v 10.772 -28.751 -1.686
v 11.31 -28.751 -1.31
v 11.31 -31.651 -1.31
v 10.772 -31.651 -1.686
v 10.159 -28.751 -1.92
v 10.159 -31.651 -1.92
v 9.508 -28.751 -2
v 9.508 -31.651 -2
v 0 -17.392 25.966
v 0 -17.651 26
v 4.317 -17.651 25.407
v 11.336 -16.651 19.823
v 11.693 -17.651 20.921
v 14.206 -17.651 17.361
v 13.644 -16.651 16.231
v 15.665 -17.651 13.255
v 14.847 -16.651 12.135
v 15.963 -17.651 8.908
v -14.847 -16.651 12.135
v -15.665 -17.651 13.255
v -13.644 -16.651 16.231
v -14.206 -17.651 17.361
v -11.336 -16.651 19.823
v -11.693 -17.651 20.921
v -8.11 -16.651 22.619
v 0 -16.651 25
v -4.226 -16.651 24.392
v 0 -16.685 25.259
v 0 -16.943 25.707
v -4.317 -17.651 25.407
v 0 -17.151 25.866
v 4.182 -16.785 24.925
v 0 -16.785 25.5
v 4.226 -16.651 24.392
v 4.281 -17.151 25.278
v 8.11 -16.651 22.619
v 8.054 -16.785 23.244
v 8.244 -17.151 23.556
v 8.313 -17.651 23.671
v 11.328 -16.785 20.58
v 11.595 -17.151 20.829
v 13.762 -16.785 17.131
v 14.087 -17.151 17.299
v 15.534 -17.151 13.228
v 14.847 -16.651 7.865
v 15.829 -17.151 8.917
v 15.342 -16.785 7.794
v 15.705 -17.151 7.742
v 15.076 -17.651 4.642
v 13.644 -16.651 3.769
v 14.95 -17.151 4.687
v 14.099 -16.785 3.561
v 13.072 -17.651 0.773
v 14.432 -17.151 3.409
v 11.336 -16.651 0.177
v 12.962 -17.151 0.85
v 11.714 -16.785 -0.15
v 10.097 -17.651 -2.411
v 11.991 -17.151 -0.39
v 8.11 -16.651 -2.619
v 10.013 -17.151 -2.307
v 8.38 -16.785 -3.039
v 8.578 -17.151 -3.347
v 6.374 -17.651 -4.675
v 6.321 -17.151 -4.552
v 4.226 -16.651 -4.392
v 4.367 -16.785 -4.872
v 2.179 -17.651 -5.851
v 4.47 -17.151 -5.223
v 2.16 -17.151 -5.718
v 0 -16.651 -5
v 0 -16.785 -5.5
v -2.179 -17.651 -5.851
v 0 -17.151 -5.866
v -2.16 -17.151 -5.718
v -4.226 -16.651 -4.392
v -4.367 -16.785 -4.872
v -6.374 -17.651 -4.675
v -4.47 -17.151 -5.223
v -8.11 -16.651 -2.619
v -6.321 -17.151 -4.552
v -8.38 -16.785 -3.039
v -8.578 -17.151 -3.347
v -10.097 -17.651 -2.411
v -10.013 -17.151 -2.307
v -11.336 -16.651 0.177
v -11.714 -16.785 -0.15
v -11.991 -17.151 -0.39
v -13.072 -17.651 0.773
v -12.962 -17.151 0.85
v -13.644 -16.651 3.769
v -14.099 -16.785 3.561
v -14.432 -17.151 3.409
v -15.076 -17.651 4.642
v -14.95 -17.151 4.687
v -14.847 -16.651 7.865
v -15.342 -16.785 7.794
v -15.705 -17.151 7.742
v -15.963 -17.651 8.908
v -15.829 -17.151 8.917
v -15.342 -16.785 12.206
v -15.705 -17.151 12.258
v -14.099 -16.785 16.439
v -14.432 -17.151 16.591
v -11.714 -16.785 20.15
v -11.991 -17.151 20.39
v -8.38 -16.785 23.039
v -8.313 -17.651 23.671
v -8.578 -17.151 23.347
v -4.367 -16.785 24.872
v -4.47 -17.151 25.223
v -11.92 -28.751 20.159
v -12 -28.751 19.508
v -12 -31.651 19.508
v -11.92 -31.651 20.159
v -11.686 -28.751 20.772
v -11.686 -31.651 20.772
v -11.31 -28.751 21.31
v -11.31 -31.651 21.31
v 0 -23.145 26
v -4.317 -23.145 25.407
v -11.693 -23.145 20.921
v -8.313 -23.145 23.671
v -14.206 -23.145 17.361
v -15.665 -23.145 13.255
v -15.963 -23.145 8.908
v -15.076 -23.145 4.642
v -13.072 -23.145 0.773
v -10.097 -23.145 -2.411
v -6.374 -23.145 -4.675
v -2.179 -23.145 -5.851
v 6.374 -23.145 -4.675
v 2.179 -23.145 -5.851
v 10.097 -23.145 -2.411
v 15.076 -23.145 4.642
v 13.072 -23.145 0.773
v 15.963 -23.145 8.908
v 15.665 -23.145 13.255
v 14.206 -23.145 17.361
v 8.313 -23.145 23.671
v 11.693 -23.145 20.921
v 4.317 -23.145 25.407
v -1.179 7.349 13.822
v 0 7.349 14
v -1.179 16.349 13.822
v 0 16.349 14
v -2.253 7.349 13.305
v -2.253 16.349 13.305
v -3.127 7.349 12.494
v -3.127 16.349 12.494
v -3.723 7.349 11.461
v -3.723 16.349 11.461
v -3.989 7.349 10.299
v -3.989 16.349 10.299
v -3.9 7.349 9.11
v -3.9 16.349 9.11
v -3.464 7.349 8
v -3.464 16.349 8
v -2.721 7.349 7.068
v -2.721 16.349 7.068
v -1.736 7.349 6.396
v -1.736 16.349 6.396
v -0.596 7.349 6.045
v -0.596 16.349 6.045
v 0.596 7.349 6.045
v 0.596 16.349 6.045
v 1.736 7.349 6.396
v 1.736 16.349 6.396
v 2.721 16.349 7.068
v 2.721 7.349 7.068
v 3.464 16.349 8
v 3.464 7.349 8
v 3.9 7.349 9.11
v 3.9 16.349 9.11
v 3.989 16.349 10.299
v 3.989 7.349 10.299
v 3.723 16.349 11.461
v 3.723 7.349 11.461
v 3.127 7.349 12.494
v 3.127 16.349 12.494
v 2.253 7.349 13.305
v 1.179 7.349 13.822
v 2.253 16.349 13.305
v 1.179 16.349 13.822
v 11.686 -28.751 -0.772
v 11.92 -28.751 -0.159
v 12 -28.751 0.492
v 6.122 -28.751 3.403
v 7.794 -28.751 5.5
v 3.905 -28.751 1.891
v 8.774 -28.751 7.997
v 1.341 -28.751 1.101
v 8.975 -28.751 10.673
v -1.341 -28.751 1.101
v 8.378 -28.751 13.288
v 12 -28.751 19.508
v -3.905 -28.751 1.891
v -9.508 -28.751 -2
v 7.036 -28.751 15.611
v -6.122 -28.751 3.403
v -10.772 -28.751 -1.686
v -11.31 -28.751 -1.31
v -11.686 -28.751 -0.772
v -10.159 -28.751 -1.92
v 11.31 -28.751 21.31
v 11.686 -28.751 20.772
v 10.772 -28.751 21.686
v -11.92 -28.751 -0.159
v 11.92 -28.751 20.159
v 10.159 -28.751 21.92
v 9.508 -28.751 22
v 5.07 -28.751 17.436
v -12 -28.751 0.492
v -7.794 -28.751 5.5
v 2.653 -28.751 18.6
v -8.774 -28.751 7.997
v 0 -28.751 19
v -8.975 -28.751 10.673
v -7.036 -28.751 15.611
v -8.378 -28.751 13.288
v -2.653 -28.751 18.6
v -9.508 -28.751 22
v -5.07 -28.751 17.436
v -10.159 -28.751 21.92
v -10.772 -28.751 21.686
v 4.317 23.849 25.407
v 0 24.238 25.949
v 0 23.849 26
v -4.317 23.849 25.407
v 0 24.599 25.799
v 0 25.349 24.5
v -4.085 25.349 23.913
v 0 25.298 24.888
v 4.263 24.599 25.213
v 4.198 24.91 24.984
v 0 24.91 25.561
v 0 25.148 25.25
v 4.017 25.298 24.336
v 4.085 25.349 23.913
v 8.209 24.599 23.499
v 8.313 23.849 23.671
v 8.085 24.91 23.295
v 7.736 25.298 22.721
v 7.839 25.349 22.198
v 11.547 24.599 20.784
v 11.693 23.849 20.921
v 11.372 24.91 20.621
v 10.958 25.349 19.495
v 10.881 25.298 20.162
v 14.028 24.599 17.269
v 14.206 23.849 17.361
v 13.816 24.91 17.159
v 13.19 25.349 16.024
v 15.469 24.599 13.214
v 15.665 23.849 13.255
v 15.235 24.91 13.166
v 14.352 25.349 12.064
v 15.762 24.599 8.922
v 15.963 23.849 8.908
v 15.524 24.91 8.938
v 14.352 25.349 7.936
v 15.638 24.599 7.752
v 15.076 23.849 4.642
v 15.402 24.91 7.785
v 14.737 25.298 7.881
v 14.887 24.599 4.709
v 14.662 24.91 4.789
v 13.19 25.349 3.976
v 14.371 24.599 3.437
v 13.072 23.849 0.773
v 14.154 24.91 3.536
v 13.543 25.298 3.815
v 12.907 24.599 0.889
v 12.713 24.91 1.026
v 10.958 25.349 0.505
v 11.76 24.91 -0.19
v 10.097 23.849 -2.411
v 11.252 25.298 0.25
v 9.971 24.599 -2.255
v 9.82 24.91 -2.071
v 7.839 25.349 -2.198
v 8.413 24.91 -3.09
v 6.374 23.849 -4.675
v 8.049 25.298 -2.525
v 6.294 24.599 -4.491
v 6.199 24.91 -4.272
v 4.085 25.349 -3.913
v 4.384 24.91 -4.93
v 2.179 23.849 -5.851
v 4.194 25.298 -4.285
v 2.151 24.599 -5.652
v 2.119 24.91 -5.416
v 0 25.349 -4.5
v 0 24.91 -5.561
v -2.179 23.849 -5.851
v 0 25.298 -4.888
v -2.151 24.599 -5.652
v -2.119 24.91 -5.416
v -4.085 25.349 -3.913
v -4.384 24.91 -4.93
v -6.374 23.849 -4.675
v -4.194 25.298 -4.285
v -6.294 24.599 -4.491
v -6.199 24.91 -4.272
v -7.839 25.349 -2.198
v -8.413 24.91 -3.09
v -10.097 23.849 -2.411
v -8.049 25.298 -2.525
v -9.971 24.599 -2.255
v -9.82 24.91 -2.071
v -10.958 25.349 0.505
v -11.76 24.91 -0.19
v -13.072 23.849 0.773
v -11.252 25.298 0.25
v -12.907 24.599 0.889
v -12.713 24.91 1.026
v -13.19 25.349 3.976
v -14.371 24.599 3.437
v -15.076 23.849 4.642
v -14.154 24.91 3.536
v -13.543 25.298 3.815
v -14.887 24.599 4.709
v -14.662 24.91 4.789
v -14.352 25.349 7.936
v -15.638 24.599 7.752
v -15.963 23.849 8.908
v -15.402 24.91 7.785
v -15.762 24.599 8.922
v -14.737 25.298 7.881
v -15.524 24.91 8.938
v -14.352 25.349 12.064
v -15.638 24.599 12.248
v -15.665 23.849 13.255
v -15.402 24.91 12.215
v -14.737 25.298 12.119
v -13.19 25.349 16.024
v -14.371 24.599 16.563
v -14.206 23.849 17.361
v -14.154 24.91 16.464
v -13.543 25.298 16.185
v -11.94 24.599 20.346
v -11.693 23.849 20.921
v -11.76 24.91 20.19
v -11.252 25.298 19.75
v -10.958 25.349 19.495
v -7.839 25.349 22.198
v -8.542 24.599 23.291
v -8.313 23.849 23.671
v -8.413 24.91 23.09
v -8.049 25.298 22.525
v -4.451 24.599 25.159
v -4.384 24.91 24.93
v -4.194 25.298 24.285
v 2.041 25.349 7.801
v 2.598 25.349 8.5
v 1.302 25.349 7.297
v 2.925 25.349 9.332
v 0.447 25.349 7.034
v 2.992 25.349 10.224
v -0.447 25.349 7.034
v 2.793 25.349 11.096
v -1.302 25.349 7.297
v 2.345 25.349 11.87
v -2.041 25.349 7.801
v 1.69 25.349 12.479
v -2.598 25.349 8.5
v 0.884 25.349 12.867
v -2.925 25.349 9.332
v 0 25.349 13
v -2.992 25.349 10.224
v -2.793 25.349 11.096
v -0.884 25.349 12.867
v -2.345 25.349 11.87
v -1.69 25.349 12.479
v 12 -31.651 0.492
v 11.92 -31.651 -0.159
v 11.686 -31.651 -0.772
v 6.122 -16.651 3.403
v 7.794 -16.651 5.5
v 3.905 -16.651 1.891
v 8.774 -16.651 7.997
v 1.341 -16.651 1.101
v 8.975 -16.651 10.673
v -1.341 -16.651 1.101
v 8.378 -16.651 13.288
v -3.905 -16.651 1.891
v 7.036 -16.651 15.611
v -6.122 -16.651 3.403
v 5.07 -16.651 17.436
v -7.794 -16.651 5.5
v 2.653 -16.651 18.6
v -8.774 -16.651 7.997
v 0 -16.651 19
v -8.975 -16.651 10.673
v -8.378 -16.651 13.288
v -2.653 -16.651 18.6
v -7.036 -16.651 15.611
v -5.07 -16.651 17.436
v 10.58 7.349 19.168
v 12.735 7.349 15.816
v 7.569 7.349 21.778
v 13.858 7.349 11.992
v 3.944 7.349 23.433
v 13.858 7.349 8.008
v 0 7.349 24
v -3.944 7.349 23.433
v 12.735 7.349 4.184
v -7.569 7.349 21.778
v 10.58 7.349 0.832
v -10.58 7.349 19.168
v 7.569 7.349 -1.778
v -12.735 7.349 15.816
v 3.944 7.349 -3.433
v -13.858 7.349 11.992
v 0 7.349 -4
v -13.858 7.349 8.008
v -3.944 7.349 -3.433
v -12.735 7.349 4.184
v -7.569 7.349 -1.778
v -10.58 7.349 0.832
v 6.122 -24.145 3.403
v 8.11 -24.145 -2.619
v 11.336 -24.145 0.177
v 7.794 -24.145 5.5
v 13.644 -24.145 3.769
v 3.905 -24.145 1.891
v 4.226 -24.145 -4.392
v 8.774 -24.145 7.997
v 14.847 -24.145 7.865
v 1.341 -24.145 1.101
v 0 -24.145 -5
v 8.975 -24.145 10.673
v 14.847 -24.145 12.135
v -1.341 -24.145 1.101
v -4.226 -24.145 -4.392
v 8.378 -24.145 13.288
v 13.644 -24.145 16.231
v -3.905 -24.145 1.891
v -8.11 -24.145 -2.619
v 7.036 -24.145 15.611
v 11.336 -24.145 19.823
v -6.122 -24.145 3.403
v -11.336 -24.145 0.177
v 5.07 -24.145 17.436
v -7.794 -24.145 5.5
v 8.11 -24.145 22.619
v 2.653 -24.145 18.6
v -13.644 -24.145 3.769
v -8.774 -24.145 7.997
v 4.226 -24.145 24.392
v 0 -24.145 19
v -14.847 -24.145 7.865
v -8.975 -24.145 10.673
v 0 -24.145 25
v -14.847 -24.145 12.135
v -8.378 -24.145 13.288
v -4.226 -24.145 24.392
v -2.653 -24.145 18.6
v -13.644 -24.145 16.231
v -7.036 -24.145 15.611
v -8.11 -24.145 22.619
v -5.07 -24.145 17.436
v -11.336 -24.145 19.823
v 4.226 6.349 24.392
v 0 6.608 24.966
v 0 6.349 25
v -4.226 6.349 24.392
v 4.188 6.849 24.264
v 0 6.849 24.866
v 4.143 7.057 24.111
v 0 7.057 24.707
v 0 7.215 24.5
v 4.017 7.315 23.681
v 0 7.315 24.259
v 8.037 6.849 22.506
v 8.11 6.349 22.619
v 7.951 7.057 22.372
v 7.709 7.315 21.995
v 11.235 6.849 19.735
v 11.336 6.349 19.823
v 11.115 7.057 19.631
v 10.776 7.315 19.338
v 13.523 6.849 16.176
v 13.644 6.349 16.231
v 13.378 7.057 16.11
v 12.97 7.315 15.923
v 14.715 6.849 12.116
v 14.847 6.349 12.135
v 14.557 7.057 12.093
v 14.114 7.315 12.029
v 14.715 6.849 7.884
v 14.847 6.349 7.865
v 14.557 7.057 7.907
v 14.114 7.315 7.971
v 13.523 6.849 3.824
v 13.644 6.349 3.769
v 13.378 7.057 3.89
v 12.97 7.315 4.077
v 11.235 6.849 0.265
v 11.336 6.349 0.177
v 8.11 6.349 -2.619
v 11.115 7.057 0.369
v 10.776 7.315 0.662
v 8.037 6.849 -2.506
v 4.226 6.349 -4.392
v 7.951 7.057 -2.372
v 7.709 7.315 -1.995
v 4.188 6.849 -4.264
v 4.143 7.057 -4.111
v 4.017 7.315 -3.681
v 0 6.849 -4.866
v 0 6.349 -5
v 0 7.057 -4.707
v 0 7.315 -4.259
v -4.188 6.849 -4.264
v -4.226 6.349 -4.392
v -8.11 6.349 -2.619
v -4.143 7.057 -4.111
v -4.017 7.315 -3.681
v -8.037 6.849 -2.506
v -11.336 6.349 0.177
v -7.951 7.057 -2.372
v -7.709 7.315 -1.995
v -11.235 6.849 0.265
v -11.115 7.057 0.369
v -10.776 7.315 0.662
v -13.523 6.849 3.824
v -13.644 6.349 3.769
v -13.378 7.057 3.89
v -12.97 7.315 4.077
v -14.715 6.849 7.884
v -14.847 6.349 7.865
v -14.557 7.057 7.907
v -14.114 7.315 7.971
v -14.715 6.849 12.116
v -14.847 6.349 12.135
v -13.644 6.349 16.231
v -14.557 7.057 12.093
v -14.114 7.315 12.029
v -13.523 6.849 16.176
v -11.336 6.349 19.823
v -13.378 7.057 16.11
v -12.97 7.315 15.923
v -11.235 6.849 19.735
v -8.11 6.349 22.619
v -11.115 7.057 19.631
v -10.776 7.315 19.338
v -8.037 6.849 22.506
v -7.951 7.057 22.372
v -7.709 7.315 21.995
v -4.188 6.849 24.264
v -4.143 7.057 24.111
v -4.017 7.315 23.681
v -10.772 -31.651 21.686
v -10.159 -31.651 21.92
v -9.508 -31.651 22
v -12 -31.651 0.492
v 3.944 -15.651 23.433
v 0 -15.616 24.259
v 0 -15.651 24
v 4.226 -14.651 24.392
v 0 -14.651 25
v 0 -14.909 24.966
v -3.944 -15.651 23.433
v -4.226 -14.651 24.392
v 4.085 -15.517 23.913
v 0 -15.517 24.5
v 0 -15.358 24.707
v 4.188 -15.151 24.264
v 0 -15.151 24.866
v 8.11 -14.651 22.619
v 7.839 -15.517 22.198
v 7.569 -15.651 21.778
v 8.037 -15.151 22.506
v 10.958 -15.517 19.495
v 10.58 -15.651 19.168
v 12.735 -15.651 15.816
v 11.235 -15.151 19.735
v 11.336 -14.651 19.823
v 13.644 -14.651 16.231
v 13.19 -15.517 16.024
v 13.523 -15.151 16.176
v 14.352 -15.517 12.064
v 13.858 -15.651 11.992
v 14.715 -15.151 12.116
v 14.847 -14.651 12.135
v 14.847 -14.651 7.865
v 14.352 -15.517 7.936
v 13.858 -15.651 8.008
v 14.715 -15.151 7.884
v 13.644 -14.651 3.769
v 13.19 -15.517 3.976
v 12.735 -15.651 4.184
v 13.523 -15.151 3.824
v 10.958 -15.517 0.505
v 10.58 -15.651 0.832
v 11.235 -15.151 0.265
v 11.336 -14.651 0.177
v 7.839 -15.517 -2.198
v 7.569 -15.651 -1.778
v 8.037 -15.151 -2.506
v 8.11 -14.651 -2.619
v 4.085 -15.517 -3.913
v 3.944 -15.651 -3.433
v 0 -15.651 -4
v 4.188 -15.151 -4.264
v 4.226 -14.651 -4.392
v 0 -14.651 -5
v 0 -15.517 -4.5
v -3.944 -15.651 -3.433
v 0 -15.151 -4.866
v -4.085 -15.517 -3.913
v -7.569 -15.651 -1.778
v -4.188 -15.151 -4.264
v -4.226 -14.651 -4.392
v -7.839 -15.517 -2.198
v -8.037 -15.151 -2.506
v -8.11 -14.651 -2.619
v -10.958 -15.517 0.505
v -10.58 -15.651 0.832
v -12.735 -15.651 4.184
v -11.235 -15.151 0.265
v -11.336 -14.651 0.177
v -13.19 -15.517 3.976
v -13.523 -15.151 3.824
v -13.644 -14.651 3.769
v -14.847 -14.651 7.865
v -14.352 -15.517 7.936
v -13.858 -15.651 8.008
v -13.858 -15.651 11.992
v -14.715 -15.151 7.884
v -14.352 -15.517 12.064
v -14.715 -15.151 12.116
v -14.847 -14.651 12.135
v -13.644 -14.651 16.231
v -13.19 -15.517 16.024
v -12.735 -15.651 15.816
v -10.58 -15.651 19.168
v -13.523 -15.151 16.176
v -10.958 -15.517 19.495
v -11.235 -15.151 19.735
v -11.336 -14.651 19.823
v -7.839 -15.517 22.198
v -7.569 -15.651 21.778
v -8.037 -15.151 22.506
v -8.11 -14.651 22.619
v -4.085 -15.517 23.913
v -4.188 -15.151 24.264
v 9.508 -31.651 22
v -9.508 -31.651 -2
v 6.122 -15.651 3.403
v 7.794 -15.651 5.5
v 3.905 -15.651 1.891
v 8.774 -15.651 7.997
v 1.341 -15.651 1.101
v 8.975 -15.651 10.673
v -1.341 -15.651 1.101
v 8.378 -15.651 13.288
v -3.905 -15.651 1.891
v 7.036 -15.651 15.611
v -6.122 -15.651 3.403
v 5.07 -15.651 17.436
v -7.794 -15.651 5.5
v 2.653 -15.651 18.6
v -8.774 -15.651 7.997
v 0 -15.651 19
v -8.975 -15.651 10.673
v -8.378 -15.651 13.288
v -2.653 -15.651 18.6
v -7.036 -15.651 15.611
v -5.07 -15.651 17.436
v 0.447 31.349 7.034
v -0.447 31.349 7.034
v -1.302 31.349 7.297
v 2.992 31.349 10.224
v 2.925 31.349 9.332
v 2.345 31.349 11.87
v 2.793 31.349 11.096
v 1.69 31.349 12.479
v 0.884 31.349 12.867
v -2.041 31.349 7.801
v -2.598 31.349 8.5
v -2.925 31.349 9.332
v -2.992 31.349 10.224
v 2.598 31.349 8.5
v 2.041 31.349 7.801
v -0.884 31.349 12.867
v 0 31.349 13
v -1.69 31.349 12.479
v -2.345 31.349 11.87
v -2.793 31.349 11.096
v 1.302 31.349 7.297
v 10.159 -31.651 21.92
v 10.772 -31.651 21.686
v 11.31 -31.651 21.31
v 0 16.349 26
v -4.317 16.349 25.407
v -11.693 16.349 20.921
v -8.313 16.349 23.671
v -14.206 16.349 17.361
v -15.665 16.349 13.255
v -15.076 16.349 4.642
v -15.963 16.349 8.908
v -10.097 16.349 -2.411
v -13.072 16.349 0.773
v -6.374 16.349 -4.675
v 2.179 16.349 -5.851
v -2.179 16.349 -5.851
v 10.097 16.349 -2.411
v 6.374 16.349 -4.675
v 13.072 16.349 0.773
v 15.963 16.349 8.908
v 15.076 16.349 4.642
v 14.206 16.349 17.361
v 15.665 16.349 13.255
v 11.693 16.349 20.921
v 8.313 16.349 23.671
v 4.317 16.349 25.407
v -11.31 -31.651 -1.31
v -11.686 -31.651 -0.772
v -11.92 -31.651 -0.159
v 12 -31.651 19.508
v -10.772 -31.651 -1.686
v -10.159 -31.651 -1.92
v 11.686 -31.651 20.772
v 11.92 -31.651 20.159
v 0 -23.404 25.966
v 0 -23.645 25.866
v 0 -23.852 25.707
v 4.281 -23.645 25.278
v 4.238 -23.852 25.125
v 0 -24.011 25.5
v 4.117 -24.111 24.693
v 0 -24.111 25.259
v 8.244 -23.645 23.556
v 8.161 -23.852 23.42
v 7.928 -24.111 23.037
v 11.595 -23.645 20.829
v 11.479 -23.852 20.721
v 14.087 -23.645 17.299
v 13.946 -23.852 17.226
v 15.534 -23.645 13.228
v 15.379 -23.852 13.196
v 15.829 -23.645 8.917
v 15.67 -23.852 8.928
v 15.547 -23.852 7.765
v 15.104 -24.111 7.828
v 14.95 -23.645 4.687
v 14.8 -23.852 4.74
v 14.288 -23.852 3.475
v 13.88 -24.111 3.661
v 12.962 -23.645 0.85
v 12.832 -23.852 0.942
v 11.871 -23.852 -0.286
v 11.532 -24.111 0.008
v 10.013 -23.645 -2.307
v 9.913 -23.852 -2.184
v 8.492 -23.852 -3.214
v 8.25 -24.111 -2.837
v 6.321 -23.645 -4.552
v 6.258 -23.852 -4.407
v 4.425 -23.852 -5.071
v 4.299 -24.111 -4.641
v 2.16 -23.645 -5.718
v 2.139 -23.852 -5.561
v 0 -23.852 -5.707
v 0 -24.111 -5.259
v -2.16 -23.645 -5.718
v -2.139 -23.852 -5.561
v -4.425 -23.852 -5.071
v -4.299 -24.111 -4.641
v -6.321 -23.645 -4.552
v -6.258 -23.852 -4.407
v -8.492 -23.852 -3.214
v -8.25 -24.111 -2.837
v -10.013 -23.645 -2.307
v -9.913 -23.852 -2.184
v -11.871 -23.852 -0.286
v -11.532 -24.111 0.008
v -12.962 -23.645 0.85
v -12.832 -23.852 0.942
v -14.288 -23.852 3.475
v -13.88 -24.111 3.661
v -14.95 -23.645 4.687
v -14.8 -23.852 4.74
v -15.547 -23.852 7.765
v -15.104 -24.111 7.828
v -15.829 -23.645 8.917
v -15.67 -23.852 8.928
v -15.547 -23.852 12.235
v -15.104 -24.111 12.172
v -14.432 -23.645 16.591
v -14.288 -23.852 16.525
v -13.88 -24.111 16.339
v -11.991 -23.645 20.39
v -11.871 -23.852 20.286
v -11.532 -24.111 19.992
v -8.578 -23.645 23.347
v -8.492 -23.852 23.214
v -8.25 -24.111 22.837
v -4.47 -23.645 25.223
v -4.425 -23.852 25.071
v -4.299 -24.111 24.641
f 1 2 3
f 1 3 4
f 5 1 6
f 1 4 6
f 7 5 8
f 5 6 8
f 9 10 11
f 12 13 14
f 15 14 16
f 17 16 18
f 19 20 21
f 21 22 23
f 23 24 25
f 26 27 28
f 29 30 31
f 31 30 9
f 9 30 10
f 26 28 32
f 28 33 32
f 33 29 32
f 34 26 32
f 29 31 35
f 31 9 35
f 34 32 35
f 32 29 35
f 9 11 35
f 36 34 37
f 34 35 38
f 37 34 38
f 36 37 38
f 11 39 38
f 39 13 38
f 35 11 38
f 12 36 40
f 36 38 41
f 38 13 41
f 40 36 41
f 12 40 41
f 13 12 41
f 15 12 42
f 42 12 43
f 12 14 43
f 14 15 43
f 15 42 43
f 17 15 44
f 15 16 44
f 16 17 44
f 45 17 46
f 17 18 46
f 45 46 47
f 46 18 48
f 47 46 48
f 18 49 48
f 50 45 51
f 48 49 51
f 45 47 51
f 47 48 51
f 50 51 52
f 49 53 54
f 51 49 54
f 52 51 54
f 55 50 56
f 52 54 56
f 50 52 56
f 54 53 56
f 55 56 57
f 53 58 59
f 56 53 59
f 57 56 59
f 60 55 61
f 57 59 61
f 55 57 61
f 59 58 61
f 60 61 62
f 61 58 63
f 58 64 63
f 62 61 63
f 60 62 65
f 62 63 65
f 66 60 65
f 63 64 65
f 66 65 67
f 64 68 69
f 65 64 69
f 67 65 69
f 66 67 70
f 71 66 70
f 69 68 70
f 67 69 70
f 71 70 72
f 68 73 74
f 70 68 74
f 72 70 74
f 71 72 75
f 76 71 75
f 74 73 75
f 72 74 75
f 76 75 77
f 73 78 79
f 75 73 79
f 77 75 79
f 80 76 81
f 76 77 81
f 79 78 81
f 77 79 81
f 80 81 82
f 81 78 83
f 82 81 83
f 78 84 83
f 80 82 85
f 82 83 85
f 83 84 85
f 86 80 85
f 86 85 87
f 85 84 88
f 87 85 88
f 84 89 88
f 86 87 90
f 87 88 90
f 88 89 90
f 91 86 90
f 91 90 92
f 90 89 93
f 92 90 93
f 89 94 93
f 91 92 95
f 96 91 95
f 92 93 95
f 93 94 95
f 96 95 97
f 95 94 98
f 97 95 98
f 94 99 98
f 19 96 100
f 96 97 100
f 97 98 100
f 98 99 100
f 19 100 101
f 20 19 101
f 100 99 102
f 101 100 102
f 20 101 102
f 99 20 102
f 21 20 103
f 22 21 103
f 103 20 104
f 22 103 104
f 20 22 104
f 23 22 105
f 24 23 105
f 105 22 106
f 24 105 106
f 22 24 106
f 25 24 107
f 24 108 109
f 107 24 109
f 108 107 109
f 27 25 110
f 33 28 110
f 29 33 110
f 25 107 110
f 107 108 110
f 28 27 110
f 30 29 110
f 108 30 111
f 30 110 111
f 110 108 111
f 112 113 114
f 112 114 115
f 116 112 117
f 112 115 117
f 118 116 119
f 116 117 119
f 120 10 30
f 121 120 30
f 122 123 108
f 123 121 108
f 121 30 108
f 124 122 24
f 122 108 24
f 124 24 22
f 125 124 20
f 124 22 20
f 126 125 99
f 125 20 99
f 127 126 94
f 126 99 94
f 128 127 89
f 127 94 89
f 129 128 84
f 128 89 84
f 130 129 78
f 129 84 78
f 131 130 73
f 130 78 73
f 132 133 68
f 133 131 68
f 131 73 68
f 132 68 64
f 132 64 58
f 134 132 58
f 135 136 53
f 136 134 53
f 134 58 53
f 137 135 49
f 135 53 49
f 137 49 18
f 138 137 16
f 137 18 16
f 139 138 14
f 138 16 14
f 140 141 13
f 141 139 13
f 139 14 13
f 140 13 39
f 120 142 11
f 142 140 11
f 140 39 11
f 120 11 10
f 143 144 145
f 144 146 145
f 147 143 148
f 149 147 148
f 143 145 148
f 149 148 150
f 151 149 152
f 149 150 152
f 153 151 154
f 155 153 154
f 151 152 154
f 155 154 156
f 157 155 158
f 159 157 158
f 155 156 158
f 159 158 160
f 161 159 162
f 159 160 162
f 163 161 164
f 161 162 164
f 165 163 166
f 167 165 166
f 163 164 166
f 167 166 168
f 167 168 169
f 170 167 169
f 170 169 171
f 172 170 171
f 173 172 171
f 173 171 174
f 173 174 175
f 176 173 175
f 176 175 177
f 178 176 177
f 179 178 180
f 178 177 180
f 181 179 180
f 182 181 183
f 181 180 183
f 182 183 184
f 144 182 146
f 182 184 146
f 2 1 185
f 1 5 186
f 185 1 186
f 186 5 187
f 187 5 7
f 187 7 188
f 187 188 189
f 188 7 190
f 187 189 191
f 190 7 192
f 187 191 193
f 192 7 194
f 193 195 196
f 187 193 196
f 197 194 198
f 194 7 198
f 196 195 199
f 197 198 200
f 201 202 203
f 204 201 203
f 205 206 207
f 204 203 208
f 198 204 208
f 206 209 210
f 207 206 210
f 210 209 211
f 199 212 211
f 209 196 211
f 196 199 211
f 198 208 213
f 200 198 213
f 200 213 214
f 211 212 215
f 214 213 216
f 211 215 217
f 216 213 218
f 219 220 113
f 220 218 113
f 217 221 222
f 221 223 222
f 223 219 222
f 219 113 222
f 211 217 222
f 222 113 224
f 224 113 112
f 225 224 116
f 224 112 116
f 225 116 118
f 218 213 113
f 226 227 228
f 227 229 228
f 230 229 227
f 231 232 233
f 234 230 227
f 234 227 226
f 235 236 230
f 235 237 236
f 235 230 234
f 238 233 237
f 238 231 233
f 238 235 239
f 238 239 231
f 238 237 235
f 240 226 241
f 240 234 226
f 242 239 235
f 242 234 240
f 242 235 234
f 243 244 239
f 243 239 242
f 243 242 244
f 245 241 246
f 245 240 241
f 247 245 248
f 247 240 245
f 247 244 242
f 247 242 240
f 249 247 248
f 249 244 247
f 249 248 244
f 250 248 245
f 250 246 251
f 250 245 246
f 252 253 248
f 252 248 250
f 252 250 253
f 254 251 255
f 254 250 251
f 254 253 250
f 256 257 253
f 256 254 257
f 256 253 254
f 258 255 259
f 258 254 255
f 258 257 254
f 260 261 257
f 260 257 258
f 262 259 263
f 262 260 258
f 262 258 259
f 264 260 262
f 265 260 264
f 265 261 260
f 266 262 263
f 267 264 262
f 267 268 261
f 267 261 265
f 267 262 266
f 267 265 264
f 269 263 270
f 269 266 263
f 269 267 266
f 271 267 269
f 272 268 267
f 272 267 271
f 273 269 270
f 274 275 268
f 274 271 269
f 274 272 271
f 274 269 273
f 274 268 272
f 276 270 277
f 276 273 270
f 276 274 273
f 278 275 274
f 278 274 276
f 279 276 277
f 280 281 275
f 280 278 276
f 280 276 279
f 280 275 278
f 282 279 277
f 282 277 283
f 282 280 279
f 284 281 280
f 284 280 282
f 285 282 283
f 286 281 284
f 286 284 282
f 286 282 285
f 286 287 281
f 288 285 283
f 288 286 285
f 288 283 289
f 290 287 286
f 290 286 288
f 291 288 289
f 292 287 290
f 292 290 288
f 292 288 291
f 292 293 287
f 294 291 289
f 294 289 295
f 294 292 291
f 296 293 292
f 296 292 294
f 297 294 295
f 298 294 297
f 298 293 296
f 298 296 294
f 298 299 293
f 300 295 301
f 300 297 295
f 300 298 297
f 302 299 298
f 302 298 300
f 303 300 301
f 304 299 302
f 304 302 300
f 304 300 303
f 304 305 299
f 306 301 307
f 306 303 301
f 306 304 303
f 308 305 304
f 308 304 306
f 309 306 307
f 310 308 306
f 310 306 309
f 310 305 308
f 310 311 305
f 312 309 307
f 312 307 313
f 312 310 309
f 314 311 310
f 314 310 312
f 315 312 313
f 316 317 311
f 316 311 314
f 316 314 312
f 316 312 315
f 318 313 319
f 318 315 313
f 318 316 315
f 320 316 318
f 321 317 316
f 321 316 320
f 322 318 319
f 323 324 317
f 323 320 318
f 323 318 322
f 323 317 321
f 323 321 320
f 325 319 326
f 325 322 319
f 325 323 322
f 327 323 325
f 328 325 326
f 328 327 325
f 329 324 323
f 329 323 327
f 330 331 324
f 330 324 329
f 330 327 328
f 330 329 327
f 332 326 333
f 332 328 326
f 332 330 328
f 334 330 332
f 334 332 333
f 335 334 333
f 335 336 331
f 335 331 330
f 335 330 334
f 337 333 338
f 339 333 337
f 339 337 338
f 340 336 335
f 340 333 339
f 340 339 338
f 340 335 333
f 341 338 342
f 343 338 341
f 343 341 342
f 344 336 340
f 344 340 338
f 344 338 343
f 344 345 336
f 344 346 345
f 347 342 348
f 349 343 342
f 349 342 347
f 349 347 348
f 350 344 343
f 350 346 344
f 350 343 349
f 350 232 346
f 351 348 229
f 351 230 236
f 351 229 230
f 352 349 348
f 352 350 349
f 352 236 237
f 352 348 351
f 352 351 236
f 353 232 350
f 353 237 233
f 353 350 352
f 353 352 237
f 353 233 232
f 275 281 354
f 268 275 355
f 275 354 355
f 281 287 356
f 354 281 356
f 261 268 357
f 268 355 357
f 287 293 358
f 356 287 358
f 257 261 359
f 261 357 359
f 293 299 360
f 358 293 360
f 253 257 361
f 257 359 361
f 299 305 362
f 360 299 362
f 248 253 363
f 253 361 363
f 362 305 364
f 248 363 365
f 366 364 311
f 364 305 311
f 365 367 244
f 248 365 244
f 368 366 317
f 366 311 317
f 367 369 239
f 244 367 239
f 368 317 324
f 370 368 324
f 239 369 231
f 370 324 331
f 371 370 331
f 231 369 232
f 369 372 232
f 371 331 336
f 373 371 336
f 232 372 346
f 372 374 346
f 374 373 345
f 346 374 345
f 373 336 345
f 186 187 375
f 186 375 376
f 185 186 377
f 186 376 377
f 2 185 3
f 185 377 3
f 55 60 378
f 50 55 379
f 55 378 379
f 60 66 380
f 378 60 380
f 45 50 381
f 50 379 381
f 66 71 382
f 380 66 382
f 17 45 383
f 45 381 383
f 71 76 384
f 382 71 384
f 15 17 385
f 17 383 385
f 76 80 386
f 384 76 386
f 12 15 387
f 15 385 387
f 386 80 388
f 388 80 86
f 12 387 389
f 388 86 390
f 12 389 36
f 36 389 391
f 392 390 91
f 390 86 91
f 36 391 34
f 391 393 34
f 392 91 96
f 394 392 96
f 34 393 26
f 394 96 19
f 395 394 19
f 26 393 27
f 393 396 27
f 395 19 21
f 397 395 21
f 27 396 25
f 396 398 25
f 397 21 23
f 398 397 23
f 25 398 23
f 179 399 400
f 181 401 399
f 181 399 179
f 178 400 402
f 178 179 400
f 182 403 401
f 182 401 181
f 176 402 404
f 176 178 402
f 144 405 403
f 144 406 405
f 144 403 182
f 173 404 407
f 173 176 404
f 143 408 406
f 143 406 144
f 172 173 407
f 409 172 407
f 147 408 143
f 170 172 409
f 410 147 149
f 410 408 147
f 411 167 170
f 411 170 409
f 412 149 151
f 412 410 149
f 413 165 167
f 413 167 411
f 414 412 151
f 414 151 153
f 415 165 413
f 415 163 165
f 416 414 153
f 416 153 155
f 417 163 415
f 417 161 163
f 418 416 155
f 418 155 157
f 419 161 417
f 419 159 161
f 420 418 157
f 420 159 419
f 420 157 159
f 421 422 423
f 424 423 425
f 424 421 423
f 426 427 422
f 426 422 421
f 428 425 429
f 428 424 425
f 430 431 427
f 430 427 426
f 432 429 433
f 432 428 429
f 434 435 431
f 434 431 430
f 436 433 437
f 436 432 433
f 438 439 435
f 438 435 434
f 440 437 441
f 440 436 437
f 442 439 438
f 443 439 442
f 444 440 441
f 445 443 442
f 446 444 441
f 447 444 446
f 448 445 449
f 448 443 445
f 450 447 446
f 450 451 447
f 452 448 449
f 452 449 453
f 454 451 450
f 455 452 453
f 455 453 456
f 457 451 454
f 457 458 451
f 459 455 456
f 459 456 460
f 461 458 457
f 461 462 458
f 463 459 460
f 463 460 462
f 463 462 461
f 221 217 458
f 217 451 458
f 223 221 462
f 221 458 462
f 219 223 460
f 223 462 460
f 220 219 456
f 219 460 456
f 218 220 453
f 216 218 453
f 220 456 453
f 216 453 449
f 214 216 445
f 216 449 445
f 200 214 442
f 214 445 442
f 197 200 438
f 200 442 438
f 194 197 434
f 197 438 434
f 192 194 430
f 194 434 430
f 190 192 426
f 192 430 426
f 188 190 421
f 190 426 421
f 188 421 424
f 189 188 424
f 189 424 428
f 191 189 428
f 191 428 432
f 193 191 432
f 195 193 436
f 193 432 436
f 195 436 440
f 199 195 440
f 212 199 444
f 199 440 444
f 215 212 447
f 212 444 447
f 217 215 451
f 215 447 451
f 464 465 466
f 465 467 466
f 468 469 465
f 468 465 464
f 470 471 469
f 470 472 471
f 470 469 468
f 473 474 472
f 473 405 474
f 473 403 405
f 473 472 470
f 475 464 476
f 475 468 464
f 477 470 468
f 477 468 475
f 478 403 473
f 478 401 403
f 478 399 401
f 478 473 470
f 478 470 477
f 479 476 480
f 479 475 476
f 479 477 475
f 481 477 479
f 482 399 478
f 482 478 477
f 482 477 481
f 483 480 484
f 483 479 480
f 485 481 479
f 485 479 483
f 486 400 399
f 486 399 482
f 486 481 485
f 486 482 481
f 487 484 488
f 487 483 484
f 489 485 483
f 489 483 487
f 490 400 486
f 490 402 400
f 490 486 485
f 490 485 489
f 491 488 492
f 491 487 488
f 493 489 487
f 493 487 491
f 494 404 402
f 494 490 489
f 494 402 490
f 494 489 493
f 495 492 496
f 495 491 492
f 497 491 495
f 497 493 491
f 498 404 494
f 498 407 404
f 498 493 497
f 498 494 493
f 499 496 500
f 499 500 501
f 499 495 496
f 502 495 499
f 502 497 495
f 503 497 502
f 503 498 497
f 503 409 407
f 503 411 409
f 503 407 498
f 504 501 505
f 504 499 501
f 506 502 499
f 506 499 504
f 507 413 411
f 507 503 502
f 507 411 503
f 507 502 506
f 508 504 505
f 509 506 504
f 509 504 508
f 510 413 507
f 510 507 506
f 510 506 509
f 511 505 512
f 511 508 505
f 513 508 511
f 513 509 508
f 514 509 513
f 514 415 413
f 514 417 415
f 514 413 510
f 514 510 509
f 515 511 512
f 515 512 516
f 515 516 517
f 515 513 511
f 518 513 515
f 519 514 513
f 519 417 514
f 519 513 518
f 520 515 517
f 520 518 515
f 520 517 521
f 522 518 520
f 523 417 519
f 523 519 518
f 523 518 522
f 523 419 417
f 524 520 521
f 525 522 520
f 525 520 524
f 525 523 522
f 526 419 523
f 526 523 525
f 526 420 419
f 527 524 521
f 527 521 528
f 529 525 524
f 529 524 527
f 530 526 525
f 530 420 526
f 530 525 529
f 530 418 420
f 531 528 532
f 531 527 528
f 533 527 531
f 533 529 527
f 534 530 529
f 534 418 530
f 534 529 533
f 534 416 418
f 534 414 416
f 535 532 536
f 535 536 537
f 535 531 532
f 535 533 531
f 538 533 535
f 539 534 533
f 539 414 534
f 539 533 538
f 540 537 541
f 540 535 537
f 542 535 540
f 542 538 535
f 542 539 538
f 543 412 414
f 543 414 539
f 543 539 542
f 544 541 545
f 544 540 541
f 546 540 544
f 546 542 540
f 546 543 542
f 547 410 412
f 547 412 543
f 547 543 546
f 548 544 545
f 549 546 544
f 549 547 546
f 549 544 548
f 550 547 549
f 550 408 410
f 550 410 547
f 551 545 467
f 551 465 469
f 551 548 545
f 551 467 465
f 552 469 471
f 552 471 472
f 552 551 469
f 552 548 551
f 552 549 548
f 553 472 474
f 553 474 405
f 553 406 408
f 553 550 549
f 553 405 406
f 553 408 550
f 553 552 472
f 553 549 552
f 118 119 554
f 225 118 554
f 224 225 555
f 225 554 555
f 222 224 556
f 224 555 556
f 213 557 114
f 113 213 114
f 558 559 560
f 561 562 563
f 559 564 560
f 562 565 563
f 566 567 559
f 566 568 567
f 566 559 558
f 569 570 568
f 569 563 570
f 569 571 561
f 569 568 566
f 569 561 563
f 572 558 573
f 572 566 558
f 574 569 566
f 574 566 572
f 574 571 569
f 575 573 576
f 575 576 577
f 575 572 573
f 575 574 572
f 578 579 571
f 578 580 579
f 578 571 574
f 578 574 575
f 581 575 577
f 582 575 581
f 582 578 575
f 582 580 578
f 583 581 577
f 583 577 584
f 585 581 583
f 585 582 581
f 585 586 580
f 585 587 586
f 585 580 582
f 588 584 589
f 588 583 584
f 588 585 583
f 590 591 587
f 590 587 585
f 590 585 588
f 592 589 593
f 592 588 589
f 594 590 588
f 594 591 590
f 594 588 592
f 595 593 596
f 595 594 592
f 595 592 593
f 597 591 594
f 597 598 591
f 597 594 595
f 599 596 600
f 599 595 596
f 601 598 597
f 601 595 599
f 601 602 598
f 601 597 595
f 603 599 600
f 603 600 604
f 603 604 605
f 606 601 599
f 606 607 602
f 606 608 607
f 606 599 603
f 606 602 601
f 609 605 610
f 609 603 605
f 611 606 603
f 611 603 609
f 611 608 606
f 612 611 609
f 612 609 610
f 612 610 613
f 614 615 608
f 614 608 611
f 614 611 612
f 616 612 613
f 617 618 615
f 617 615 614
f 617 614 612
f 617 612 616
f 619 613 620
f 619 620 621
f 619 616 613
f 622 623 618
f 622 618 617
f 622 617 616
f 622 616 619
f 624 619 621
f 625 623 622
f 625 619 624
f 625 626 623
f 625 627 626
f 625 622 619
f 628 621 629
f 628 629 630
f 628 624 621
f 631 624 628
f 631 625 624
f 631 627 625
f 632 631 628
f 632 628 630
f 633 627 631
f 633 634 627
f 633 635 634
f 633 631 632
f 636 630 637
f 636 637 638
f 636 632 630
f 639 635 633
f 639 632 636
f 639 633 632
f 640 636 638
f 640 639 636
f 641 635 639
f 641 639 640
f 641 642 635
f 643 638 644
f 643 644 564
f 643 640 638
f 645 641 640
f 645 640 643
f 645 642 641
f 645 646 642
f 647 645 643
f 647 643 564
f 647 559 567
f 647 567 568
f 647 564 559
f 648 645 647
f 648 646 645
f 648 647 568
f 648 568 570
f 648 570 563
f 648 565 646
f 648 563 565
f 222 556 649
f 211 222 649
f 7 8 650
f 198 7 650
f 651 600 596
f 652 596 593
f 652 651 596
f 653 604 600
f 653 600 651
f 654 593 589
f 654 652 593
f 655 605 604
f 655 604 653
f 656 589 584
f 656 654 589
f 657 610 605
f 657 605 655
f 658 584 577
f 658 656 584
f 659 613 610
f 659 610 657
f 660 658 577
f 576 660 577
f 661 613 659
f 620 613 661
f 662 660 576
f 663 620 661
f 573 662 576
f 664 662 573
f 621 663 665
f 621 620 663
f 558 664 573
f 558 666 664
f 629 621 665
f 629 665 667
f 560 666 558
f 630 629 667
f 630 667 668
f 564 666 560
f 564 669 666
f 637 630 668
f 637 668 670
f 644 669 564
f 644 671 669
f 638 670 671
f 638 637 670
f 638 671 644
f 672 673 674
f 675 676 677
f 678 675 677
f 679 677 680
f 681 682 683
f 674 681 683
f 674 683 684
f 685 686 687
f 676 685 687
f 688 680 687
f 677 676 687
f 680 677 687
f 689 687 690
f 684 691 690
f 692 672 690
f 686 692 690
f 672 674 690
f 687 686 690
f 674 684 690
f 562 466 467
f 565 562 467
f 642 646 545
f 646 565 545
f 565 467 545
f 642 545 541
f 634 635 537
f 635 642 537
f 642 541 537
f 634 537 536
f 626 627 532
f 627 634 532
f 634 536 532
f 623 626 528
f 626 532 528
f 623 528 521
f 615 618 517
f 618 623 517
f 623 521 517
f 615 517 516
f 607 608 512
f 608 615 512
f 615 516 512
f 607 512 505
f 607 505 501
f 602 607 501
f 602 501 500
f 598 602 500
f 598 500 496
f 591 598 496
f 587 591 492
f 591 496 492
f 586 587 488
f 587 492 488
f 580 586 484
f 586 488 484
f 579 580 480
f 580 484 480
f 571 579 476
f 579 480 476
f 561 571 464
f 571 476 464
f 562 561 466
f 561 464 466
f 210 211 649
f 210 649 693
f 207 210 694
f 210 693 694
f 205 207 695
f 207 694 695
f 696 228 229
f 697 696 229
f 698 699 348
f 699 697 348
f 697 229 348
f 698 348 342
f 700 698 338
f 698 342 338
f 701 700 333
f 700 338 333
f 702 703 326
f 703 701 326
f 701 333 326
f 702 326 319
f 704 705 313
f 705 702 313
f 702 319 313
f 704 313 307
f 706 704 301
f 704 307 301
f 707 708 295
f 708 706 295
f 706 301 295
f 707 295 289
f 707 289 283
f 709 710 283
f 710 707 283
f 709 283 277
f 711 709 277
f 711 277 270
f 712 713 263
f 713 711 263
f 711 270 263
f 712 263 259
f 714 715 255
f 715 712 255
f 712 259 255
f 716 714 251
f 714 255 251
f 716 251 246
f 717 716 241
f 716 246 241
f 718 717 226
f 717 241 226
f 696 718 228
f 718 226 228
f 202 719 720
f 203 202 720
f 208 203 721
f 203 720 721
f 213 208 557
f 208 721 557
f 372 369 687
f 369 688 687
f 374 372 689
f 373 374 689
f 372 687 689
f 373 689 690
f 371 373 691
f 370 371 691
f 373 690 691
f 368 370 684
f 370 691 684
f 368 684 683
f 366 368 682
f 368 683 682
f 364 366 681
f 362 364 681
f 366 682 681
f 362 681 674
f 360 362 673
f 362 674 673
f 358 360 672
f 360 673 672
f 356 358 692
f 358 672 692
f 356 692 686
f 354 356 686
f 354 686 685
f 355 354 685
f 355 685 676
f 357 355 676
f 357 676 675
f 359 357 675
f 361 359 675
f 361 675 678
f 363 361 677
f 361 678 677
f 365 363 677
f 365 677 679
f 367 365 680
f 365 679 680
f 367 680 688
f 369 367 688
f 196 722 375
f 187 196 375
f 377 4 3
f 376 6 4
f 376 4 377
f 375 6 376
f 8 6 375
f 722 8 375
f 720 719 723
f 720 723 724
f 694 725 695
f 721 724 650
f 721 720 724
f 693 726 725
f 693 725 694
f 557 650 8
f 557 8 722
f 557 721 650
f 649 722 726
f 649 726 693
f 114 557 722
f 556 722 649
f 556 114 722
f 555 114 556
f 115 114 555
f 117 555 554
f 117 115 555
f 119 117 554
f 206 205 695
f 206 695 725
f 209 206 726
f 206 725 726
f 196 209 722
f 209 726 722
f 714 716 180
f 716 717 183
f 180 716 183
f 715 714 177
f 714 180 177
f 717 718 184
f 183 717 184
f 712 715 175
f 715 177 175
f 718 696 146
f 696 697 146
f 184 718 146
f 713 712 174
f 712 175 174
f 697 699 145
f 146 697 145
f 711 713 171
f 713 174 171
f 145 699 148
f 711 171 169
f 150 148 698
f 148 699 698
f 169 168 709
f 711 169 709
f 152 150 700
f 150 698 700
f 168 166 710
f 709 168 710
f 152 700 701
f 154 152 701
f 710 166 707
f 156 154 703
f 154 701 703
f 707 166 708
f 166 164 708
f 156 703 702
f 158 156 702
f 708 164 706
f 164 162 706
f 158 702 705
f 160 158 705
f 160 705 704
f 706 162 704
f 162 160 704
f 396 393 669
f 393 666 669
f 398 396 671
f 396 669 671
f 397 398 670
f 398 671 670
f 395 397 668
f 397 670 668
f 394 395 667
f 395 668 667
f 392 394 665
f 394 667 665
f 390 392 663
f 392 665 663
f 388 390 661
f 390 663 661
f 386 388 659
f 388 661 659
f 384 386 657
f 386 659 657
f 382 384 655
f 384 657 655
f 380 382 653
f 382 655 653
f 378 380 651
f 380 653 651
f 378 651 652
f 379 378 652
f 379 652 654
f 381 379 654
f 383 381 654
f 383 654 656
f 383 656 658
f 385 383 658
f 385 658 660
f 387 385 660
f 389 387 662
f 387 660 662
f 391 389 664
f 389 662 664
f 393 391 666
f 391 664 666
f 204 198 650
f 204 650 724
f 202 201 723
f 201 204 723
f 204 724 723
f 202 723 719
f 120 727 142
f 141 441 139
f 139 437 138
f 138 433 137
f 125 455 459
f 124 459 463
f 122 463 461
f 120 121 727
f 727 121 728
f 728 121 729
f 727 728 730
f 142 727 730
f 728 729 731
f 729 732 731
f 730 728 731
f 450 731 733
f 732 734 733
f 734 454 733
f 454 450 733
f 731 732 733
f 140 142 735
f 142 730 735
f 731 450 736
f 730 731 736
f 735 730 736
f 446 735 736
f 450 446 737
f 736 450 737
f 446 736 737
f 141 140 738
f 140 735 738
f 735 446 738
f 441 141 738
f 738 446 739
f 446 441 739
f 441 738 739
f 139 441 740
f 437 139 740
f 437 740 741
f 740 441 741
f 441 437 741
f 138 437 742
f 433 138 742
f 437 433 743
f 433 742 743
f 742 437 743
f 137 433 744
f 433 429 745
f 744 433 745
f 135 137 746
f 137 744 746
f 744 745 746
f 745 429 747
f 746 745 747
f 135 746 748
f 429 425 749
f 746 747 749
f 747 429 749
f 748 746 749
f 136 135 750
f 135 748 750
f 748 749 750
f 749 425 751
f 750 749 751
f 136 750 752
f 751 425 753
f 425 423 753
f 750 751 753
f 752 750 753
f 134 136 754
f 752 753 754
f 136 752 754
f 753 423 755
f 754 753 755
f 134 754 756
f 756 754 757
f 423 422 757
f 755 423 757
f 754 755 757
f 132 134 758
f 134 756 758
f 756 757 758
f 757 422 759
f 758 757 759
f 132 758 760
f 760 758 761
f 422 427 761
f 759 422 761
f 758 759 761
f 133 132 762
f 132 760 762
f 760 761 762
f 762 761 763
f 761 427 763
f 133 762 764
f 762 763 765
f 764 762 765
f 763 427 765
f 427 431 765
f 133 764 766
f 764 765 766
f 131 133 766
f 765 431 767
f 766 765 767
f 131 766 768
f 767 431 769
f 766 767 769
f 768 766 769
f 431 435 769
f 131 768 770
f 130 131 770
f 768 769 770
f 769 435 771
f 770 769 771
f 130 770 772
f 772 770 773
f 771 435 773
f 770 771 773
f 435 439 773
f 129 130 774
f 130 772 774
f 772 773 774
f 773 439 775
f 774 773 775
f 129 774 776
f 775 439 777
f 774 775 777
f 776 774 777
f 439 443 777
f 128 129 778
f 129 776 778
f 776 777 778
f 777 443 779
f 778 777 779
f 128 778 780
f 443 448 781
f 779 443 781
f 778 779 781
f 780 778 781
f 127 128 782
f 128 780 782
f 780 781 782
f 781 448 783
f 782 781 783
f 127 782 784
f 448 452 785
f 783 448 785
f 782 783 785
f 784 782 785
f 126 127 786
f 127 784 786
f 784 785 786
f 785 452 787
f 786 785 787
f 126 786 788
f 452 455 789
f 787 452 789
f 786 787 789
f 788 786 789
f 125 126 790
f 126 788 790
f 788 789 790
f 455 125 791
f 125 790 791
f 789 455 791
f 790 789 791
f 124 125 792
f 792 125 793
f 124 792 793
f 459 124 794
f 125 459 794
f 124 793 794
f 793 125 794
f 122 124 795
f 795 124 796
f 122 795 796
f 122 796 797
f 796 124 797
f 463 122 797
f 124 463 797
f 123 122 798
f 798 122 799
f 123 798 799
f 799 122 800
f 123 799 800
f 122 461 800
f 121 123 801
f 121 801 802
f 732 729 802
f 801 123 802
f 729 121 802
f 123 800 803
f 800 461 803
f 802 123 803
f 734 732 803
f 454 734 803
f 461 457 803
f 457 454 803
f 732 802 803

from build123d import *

# Parameters (mm, degrees)
SKIZZE1_W                       = 16
SKIZZE1_H                       = 63
SKIZZE6_W                       = 14.056140901
SKIZZE6_H                       = 6
SCHNITT_LINEAR_AUSTRAGEN2_DEPTH = 2.9
SKIZZE8_W                       = 9.697943534
SKIZZE8_H                       = 4.605462576
VERRUNDUNG1_R                   = 2.7
SKIZZE9_W                       = 13.512274764
SKIZZE9_H                       = 9
SKIZZE11_W                      = 2.793838278
SKIZZE11_H                      = 24.477994545
SKIZZE12_W                      = 8.586499361
SKIZZE12_H                      = 1
VERRUNDUNG2_R                   = 1.5
VERRUNDUNG3_R                   = 1
VERRUNDUNG4_R                   = 1


with BuildPart() as part:
    # Skizze1 → Rotation1 (revolve)
    with BuildSketch(Plane(origin=(0, 0, 0), x_dir=(0, 0, -1), z_dir=(1, 0, 0))):
        with Locations((-18, -0.15056419)):
            Rectangle(SKIZZE1_W, SKIZZE1_H)
    revolve(axis=Axis((0, 31.34943581, 10), (0, -1, 0)))

    # Skizze6 → Schnitt-Rotation1 (revolve, cut)
    with BuildSketch(Plane.XY.offset(10), mode=Mode.PRIVATE) as schnitt_rotation1_sk:
        with Locations((-10.028070451, 28.34943581)):
            Rectangle(SKIZZE6_W, SKIZZE6_H)
    revolve(schnitt_rotation1_sk.sketch.rotate(Axis((0, 55, 10), (0, -1, 0)), 270), axis=Axis((0, 55, 10), (0, -1, 0)), mode=Mode.SUBTRACT)

    # Skizze7 → Schnitt-Linear austragen2 (cut)
    with BuildSketch(Plane.XZ.offset(31.65056419)):
        with BuildLine():
            Line((-10.583005244, 22), (10.583005244, 22))
            ThreePointArc((10.583005244, 22), (0, 26), (-10.583005244, 22))
        make_face()
        with BuildLine():
            ThreePointArc((16, 10), (14.966629547, 15.656854249), (12, 20.583005244))
            Line((12, 20.583005244), (12, -0.583005244))
            ThreePointArc((12, -0.583005244), (14.966629547, 4.343145751), (16, 10))
        make_face()
        with BuildLine():
            ThreePointArc((-10.583005244, -2), (0, -6), (10.583005244, -2))
            Line((10.583005244, -2), (-10.583005244, -2))
        make_face()
        with BuildLine():
            Line((-12, -0.583005244), (-12, 20.583005244))
            ThreePointArc((-12, 20.583005244), (-16, 10), (-12, -0.583005244))
        make_face()
    extrude(amount=-SCHNITT_LINEAR_AUSTRAGEN2_DEPTH, mode=Mode.SUBTRACT)

    # Skizze8 → Schnitt-Rotation2 (revolve, cut)
    with BuildSketch(Plane.XY.offset(10), mode=Mode.PRIVATE) as schnitt_rotation2_sk:
        with Locations((-13.848971767, -26.447832902)):
            Rectangle(SKIZZE8_W, SKIZZE8_H)
    revolve(schnitt_rotation2_sk.sketch.rotate(Axis((0, 55, 10), (0, -1, 0)), 270), axis=Axis((0, 55, 10), (0, -1, 0)), mode=Mode.SUBTRACT)

    # Verrundung1
    # the kernel refuses this fillet: 2.7 mm, written as the material it takes off along each edge
    with BuildSketch(Plane(origin=(-12, -34.598571865, 20.583005244), x_dir=(0.6886261541674549, 0, 0.72511655600775), z_dir=(0, 1, 0)), Plane(origin=(-10.583005244, -34.598571865, -2), x_dir=(-0.7251165560077487, 0, 0.6886261541674565), z_dir=(0, 1, 0)), Plane(origin=(10.583005244, -34.598571865, 22), x_dir=(0.72511655600775, 0, -0.6886261541674551), z_dir=(0, 1, 0)), Plane(origin=(12, -34.598571865, -0.583005244), x_dir=(-0.6886261541674555, 0, -0.7251165560077496), z_dir=(0, 1, 0))) as verrundung1_piece_1:
        with BuildLine():
            CenterArc((1.079707811, 2.698166172), VERRUNDUNG1_R, 226.478544781, 45.633288329)
            Line((-0.779582805, 0.740351471), (0, 0))
            ThreePointArc((0, 0), (0.589601535, -0.010867127), (1.17920307, 0))
        make_face()
    extrude(amount=8.796015351, mode=Mode.SUBTRACT)
    with BuildSketch(Plane(origin=(-12, -34.598571865, -0.583005244), x_dir=(0, 0, 1), z_dir=(0, 1, 0)), Plane(origin=(10.583005244, -34.598571865, -2), x_dir=(-1, 0, 0), z_dir=(0, 1, 0)), Plane(origin=(12, -34.598571865, 20.583005244), x_dir=(0, 0, -1), z_dir=(0, 1, 0))) as verrundung1_piece_2:
        with BuildLine():
            CenterArc((1.075113785, 2.7), VERRUNDUNG1_R, 224.366711671, 45.633288329)
            ThreePointArc((-0.855059669, 0.812030075), (-0.435013222, 0.398135104), (0, 0))
            Line((0, 0), (1.075113785, 0))
        make_face()
    extrude(amount=8.796015351, mode=Mode.SUBTRACT)
    with BuildSketch(Plane(origin=(-10.583005244, -34.598571865, 22), x_dir=(-0.7251165560077509, 0, -0.6886261541674541), z_dir=(0, 1, 0))) as verrundung1_piece_3:
        with BuildLine():
            CenterArc((1.079707811, -2.698166172), VERRUNDUNG1_R, 87.88816689, 45.633288329)
            Line((-0.779582805, -0.740351471), (0, 0))
            ThreePointArc((0, 0), (0.589601535, 0.010867127), (1.17920307, 0))
        make_face()
    extrude(amount=8.796015351, mode=Mode.SUBTRACT)

    # Skizze9 → Schnitt-Rotation3 (revolve, cut)
    with BuildSketch(Plane.XY.offset(10), mode=Mode.PRIVATE) as schnitt_rotation3_sk:
        with Locations((10.756137382, 11.84943581)):
            Rectangle(SKIZZE9_W, SKIZZE9_H)
    revolve(schnitt_rotation3_sk.sketch.rotate(Axis((0, 55, 10), (0, -1, 0)), 90), axis=Axis((0, 55, 10), (0, -1, 0)), mode=Mode.SUBTRACT)

    # Skizze11 → Schnitt-Rotation4 (revolve, cut)
    with BuildSketch(Plane.XY.offset(10), mode=Mode.PRIVATE) as schnitt_rotation4_sk:
        with Locations((-16.396919139, -4.411566918)):
            Rectangle(SKIZZE11_W, SKIZZE11_H)
    revolve(schnitt_rotation4_sk.sketch.rotate(Axis((0, 55, 10), (0, -1, 0)), 270), axis=Axis((0, 55, 10), (0, -1, 0)), mode=Mode.SUBTRACT)

    # Skizze12 → Schnitt-Rotation5 (revolve, cut)
    with BuildSketch(Plane.XY.offset(10), mode=Mode.PRIVATE) as schnitt_rotation5_sk:
        with Locations((-13.293249681, -16.15056419)):
            Rectangle(SKIZZE12_W, SKIZZE12_H)
    revolve(schnitt_rotation5_sk.sketch.rotate(Axis((0, 55, 10), (0, -1, 0)), 270), axis=Axis((0, 55, 10), (0, -1, 0)), mode=Mode.SUBTRACT)

    # Verrundung2
    verrundung2_edges = [part.edges().sort_by_distance(p)[0] for p in [
        (0, 25.34943581, -6),
    ]]
    fillet(verrundung2_edges, radius=VERRUNDUNG2_R)

    # Verrundung3
    verrundung3_edges = [part.edges().sort_by_distance(p)[0] for p in [
        (0, -16.65056419, -6),
        (0, -24.145101614, -6),
    ]]
    fillet(verrundung3_edges, radius=VERRUNDUNG3_R)

    # Verrundung4
    verrundung4_edges = [part.edges().sort_by_distance(p)[0] for p in [
        (0, 7.34943581, -5),
        (0, -15.65056419, -5),
    ]]
    fillet(verrundung4_edges, radius=VERRUNDUNG4_R)


solid = part.part
